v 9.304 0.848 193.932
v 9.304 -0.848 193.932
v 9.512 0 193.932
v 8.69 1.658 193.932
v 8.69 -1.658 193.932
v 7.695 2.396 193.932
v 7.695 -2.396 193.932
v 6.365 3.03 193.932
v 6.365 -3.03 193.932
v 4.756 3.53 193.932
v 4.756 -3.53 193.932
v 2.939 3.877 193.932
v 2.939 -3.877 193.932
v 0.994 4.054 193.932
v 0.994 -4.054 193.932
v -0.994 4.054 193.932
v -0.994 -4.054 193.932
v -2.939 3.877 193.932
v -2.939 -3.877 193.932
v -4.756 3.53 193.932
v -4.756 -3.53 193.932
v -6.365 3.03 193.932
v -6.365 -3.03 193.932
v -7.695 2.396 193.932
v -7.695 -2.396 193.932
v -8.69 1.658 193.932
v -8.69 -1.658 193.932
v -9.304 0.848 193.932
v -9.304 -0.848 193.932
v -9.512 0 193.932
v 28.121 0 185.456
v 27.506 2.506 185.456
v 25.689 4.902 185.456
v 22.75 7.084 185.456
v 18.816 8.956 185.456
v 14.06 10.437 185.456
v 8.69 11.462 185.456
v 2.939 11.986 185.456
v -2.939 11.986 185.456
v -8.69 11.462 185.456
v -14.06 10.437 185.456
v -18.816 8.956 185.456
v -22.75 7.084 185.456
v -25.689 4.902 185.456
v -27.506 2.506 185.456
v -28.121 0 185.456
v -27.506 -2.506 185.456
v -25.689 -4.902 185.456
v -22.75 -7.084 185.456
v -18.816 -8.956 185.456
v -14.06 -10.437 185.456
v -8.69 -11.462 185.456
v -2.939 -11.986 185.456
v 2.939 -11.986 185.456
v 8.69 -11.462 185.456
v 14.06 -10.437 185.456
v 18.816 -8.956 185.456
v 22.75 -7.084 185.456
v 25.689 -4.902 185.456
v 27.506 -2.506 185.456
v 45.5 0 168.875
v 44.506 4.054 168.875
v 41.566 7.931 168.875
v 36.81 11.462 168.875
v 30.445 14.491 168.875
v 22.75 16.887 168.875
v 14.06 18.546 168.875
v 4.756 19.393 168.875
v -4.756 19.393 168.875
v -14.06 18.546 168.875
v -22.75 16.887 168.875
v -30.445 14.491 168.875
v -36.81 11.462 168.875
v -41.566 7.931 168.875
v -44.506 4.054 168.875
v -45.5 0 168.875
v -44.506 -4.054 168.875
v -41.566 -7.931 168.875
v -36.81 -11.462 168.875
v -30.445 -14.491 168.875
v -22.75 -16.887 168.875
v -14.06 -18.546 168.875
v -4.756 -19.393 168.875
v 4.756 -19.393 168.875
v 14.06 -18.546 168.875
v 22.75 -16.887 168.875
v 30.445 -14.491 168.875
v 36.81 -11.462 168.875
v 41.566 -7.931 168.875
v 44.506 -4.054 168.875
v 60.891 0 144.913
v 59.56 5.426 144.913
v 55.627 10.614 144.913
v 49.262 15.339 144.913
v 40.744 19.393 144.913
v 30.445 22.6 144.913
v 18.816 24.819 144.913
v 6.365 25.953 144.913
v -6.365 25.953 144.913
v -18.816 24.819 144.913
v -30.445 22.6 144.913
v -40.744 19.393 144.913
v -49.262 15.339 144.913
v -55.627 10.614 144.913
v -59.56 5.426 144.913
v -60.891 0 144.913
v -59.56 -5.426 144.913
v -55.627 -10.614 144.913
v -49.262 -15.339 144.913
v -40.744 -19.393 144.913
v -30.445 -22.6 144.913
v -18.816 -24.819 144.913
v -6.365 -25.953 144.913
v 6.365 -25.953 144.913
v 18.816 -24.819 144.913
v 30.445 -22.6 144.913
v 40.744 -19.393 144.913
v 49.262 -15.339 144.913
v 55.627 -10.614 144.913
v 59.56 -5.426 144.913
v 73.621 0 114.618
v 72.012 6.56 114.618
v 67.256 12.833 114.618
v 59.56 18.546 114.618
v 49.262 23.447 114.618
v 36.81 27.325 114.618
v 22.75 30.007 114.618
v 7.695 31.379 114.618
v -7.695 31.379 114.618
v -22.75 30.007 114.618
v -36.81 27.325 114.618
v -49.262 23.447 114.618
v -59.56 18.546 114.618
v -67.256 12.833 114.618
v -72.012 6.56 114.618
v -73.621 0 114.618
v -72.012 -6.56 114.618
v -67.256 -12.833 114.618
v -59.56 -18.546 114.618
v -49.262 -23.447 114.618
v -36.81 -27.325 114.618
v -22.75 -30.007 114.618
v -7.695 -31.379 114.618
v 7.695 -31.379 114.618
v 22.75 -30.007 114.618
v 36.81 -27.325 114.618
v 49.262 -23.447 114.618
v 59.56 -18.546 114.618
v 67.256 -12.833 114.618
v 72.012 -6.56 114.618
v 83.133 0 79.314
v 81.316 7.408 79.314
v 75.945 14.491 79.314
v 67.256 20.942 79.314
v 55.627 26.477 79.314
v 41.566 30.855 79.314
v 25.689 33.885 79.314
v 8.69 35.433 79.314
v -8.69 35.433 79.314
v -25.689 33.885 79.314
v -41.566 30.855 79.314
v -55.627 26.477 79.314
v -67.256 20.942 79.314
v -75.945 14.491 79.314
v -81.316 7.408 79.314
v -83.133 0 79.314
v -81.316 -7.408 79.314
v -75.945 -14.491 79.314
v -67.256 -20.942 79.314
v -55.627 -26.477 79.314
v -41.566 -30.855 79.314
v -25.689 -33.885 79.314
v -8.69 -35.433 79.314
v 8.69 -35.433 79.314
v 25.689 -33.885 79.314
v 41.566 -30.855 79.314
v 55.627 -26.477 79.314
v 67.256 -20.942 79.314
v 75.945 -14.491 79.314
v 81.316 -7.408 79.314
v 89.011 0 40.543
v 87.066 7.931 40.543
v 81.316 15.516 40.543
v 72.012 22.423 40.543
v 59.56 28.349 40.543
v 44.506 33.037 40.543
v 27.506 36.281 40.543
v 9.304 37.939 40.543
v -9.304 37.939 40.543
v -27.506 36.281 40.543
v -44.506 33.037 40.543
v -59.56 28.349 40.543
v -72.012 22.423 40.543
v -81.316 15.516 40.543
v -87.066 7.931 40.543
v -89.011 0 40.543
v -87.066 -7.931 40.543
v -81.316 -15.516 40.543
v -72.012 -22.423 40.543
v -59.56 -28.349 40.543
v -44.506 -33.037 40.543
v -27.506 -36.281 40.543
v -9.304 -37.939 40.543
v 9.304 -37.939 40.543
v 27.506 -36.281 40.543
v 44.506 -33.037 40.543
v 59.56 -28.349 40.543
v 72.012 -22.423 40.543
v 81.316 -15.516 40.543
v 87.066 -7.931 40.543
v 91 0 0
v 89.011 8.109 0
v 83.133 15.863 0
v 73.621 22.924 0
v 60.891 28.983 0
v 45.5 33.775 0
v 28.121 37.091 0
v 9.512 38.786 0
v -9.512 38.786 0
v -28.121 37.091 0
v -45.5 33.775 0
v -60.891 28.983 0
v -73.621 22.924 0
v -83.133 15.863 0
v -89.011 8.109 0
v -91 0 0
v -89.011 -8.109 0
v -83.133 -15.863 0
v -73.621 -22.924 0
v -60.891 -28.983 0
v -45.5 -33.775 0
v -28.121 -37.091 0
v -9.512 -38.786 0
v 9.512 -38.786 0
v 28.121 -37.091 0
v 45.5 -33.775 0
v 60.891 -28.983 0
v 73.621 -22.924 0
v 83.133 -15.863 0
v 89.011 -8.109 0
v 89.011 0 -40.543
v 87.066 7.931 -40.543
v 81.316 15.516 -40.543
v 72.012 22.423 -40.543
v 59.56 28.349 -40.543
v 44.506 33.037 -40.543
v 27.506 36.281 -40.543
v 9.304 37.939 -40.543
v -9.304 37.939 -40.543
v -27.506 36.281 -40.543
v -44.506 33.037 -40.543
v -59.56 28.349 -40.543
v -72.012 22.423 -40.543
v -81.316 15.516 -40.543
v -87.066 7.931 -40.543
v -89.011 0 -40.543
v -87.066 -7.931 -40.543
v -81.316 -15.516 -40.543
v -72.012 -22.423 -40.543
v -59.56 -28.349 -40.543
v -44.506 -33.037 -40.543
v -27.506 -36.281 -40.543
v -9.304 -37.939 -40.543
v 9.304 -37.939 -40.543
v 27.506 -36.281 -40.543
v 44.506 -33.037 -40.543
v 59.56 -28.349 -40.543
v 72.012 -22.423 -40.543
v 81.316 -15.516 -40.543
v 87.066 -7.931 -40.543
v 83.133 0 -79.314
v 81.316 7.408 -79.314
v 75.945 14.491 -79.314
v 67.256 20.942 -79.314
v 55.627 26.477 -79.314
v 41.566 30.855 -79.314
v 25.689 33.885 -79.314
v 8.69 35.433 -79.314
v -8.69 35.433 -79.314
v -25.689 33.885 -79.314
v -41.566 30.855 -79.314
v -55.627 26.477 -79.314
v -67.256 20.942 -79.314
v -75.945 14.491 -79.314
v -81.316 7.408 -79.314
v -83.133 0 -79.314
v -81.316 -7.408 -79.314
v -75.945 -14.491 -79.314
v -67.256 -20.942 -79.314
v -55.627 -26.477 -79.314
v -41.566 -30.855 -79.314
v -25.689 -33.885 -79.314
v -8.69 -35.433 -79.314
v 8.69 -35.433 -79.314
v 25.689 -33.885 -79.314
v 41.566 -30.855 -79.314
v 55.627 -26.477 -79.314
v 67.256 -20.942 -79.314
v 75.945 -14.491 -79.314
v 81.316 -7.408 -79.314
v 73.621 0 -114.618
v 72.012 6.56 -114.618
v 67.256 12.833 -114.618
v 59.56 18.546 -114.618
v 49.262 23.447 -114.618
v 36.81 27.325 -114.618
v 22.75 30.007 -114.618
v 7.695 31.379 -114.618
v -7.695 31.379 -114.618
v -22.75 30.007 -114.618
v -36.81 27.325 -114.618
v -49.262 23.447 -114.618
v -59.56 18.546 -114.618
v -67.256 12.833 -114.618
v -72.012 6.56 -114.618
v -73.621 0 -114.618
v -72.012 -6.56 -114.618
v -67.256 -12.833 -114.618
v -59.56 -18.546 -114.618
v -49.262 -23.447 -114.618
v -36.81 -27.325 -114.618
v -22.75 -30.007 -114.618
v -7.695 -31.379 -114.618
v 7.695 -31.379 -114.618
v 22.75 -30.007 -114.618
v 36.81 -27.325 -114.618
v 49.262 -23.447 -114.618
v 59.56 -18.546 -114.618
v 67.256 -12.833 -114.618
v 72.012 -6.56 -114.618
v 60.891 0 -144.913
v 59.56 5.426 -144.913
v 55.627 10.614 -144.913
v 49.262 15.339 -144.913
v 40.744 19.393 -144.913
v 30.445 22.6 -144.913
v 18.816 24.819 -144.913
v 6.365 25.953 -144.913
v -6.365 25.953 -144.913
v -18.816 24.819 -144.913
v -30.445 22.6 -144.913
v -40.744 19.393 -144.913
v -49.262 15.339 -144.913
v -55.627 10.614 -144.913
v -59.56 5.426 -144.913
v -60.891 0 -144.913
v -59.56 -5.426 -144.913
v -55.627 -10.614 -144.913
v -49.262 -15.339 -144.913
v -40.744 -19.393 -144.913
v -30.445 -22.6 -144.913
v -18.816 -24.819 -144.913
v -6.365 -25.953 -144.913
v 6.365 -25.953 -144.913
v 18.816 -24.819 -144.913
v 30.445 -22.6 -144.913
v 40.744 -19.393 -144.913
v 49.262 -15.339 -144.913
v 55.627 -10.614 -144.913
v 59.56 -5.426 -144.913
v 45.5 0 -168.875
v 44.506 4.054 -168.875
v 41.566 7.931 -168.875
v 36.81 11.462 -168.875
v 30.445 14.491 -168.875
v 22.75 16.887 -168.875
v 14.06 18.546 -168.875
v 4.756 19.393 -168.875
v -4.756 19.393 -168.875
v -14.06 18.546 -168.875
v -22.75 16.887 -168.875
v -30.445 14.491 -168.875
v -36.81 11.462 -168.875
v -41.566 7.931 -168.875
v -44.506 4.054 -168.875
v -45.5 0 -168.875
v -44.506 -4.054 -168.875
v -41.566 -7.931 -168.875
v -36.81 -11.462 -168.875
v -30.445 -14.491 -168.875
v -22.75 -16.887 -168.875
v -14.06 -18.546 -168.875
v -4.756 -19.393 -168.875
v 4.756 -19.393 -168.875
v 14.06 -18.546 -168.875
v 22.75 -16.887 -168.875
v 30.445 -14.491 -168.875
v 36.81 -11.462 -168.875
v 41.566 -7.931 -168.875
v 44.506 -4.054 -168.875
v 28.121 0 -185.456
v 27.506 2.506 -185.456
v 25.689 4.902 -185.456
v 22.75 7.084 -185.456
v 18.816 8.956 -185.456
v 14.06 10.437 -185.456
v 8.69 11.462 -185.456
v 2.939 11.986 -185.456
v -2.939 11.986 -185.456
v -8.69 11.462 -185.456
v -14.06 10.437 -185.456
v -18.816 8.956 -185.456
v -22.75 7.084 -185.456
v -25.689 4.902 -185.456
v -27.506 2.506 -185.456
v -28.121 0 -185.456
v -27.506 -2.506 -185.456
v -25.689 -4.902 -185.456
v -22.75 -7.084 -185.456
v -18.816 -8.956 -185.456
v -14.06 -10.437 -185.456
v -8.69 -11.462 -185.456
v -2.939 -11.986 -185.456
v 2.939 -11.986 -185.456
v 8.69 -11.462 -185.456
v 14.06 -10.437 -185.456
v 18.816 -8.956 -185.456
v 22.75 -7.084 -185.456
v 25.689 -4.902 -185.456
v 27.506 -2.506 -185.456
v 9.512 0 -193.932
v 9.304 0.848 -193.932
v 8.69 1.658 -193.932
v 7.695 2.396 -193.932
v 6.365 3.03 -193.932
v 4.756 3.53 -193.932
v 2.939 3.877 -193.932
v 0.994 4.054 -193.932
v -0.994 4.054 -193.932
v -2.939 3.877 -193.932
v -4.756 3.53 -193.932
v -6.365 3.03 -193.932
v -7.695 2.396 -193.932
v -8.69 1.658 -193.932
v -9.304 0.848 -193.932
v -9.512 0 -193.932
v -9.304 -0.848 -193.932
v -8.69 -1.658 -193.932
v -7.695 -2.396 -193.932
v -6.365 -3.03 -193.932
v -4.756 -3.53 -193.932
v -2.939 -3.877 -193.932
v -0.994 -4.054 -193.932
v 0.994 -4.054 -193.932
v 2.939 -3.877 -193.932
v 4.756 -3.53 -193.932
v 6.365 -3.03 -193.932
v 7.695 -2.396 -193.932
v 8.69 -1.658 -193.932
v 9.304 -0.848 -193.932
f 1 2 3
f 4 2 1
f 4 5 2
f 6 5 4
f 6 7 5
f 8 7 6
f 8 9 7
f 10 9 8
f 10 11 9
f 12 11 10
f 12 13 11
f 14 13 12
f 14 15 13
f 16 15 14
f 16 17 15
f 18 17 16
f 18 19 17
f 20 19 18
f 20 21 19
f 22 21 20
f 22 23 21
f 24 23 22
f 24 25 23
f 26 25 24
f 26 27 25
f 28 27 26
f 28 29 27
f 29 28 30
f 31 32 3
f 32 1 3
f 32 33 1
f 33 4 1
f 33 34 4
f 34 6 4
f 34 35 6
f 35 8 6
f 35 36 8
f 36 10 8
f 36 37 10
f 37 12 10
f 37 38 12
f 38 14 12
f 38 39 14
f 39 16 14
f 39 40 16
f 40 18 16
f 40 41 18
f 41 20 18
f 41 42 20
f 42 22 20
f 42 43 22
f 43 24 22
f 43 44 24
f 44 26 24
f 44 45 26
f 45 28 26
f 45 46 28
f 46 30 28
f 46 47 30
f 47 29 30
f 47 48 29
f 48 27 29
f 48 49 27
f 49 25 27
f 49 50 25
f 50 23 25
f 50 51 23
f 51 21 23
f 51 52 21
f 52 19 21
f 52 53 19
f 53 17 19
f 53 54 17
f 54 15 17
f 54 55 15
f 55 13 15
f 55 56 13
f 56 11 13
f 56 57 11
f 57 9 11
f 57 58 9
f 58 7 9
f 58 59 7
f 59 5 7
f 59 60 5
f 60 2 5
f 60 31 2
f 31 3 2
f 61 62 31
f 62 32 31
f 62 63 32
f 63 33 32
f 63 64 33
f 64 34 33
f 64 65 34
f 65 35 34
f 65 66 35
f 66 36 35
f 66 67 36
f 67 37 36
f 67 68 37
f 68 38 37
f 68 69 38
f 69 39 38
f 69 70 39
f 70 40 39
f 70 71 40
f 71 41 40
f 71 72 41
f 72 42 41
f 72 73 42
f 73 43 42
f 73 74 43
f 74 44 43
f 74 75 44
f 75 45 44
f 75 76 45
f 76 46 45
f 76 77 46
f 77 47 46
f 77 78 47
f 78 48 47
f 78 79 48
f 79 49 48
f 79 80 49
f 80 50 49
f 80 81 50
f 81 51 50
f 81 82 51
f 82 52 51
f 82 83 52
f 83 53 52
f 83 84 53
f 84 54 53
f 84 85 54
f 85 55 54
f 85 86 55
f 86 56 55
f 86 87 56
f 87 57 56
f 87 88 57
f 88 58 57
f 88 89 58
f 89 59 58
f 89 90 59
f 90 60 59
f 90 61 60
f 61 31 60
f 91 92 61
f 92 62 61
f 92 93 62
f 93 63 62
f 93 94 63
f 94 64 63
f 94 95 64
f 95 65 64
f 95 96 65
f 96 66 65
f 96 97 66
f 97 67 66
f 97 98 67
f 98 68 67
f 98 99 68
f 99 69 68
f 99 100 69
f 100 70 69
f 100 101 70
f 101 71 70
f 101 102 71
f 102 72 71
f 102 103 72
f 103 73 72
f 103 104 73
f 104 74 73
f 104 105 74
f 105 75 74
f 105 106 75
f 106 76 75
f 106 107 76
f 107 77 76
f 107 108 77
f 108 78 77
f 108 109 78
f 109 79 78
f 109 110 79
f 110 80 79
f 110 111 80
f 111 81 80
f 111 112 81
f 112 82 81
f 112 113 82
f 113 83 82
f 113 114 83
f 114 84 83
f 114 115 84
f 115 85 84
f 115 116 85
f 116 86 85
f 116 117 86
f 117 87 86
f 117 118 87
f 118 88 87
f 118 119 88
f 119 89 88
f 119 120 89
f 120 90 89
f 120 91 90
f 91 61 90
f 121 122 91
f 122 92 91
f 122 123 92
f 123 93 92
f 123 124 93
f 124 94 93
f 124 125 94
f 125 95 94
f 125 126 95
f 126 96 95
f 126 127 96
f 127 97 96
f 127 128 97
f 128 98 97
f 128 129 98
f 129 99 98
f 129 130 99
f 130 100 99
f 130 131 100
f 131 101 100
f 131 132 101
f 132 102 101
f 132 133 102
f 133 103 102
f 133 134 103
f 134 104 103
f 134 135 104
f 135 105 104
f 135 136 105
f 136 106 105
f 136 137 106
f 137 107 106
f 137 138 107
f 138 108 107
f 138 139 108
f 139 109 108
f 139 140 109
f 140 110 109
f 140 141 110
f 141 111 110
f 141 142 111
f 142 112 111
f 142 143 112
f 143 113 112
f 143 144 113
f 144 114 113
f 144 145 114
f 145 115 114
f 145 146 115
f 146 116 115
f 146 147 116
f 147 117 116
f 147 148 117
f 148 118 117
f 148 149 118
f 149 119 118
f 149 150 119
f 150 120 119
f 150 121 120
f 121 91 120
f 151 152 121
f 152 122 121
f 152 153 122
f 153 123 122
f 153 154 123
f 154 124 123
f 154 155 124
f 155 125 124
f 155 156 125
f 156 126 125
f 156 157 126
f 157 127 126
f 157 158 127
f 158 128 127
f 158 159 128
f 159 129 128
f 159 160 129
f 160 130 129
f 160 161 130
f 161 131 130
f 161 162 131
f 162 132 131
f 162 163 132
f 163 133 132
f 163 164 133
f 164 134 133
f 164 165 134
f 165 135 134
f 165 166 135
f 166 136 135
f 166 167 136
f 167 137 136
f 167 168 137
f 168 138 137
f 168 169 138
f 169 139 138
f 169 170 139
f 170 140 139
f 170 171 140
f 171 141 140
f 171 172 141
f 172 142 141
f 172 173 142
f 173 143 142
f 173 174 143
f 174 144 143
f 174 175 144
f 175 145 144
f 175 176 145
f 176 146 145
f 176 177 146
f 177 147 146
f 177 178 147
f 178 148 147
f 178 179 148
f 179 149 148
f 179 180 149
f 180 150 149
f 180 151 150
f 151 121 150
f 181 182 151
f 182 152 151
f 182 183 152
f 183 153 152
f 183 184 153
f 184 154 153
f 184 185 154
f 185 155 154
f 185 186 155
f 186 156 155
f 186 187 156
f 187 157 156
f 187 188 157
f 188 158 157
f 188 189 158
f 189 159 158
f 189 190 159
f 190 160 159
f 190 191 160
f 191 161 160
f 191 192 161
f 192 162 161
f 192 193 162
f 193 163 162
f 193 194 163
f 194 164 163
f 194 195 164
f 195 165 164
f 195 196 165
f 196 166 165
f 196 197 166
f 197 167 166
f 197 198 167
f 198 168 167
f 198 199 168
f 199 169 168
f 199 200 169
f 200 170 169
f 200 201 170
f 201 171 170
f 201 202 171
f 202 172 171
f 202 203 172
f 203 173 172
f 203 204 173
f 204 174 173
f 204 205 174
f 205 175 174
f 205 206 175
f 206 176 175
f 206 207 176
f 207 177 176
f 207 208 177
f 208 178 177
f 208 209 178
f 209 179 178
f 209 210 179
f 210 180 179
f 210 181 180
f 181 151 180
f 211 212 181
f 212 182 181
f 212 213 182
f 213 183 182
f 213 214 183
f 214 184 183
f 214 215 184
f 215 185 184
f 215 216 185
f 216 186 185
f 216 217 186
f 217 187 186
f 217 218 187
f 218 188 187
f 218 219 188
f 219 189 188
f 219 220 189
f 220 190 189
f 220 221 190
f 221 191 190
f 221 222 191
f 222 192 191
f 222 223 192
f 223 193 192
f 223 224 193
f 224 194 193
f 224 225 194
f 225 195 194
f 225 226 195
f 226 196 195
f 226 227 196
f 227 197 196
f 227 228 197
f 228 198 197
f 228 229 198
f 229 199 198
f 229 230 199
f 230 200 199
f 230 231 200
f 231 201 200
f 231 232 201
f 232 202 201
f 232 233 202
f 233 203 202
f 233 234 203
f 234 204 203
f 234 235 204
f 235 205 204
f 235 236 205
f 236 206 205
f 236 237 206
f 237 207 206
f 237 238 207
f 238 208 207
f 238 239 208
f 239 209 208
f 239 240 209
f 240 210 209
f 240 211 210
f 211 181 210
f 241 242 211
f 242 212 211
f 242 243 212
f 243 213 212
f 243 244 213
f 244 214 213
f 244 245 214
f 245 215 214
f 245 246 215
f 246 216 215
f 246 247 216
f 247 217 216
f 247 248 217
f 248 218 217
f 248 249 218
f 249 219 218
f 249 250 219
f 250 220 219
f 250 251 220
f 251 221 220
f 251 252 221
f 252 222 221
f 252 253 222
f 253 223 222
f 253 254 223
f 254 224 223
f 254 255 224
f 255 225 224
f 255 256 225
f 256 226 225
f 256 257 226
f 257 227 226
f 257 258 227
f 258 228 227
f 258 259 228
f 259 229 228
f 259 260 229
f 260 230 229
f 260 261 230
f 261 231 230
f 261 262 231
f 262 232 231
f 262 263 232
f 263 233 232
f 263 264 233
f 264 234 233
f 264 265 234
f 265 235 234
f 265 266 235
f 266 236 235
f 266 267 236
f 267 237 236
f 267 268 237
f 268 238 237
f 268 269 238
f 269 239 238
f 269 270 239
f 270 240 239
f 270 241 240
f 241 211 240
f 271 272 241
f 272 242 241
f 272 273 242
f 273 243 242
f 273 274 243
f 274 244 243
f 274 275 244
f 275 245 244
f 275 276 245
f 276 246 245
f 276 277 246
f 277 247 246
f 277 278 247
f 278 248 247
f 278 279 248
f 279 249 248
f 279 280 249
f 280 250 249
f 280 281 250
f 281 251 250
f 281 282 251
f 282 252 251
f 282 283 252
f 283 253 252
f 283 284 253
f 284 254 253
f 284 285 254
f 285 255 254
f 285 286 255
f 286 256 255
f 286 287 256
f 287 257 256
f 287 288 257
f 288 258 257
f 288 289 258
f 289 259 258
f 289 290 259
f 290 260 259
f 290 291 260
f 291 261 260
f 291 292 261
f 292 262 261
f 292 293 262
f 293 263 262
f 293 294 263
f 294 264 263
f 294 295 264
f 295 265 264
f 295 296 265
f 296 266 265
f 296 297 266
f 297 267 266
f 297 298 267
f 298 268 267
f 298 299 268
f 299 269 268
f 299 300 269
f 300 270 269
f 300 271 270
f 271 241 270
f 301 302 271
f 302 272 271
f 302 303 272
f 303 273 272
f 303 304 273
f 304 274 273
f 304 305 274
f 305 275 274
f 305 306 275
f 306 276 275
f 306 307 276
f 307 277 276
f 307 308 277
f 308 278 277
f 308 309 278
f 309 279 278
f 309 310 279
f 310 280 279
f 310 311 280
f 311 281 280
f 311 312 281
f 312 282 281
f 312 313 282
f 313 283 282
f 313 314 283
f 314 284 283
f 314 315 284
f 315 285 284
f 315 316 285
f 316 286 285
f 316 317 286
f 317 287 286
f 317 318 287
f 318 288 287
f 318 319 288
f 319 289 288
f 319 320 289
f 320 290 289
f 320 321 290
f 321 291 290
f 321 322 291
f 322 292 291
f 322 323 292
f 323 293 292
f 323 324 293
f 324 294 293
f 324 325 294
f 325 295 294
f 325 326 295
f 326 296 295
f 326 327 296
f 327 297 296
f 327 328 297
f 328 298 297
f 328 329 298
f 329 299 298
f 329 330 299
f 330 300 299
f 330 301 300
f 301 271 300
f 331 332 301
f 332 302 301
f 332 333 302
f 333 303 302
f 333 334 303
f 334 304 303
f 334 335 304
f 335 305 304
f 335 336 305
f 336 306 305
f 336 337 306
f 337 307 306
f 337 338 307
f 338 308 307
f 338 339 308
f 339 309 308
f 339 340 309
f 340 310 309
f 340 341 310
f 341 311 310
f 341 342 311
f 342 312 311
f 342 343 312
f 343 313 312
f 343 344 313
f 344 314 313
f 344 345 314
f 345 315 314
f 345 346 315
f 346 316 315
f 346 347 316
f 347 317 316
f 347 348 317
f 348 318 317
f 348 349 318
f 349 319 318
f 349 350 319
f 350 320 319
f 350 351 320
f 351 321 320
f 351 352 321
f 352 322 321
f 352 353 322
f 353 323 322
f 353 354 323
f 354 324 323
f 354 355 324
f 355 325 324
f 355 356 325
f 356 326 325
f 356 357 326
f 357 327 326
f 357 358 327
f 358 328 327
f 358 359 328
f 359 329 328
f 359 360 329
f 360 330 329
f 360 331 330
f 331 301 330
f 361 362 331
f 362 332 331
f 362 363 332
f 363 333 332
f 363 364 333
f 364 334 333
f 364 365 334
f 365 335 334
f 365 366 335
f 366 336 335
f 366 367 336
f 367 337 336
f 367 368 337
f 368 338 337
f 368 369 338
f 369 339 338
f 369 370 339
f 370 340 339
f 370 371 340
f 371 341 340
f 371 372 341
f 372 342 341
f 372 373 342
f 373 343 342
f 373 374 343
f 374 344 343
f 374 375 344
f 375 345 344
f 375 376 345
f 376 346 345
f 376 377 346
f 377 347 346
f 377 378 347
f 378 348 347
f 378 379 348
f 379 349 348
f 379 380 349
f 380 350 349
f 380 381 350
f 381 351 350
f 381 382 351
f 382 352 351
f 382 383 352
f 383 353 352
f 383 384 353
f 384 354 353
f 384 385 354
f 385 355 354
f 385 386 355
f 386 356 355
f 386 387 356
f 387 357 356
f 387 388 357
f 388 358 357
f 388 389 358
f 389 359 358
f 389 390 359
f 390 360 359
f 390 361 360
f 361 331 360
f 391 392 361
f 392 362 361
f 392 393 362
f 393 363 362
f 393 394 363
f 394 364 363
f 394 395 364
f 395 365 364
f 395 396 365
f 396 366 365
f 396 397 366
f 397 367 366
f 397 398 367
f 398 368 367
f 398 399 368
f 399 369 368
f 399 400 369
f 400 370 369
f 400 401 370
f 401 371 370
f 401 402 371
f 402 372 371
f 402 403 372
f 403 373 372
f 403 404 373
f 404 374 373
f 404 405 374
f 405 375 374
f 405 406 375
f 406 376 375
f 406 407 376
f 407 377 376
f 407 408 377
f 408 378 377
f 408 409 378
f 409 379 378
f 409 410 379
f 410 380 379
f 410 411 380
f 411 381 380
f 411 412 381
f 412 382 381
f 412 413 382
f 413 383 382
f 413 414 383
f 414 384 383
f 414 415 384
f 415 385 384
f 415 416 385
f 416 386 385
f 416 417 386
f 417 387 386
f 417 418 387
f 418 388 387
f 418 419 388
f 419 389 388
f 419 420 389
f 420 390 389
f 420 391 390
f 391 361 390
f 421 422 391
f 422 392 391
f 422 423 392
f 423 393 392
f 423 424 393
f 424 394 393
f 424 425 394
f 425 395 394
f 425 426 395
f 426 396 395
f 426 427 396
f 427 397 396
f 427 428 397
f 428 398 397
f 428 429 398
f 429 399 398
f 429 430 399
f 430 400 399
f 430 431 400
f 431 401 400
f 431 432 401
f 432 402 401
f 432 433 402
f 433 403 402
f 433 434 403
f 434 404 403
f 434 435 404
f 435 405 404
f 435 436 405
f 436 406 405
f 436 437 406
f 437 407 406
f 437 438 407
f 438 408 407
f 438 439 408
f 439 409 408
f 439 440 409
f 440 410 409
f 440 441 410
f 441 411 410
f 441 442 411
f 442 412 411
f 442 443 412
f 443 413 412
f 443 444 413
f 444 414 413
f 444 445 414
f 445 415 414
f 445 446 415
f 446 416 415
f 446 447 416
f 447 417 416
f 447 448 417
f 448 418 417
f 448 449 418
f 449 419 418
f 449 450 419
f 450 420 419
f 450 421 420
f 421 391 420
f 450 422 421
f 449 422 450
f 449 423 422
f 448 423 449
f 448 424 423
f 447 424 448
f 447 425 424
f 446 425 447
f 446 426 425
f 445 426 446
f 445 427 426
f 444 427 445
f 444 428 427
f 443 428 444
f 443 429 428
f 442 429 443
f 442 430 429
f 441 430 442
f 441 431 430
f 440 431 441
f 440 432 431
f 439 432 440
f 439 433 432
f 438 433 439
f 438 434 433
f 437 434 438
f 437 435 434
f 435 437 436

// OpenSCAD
// Generated by SolidPython 1.0.1 on 2020-07-29 00:46:47


scale(v = [7, 3, 15]) {
	sphere(r = 13);
}
/***********************************************
*********      SolidPython code:      **********
************************************************
 
# import packages: SolidPython
from solid import *
from solid.utils import *
from itertools import chain, combinations, permutations


class Resize:

    def __init__(self, scad_file):
        self.scad_file = scad_file
        #self.scad_file = import_scad(scad_file)
        # cone/cylinder param:
        self.r1 = 0
        self.r2 = 0
        self.h = 0
        # rectangular prism param:
        self.w = 0
        self.l = 0
        # ellipse param:
        self.r = 0

    # import OpenScad code (file name corresponds to shape)


    # classify shape + parameters
    def assign(self, param1, param2, param3):
        if self.scad_file == 'cone.scad':
            self.r1 = param1
            self.r2 = param2
            self.h = param3
        elif self.scad_file == 'cylinder.scad':
            self.r1 = param1
            self.r2 = param2
            self.h = param3
        elif self.scad_file == 'rectangularPrism.scad':
            self.h = param1
            self.l = param2
            self.w = param3
        else:
            self.r = param1
            self.h = param2

    # resize parameters
    def iterate(self):
        x = range(3, 20, 2)
        i = 1
        if self.scad_file == 'cone.scad':
            tempList = list(permutations(x, 2))
            for temp in tempList:
                param1 = temp[0]
                param2 = temp[1]
                filepath = 'produced_scad_files/' + 'cone' + str(param1) + '_' + str(param2) + '_' + '.scad'
                scad_render_to_file(cylinder(h=param1, r1=param2, r2=0), filepath)

        elif self.scad_file == 'cylinder.scad':
            tempList = list(permutations(x, 3))
            for temp in tempList:
                param1 = temp[0]
                param2 = temp[1]
                filepath = 'produced_scad_files/' + 'cylinder' + str(param1) + '_' + str(param2) + '_' + '.scad'
                scad_render_to_file(cylinder(h=param1, r1=param2, r2=param2), filepath)

        elif self.scad_file == 'rectangularPrism.scad':
            tempList = list(permutations(x, 3))
            for temp in tempList:
                param1 = temp[0]
                param2 = temp[1]
                param3 = temp[2]
                filepath = 'produced_scad_files/' + 'rectangularPrism' + str(param1) + '_' + str(param2) + '_' + str(
                    param3) + '.scad'
                scad_render_to_file(cube(size=(param1, param2, param3)), filepath)

        elif self.scad_file == 'ellipse.scad':
            tempList = list(permutations(x, 4))
            for temp in tempList:
                param1 = temp[0]
                param2 = temp[1]
                param3 = temp[2]
                param4 = temp[3]
                filepath = 'produced_scad_files/' + 'ellipse' + str(param1) + '_' + str(param2) + '_' + str(param3) + '_' + str(param4) + '.scad'
                scad_render_to_file(scale([param1, param2, param3])(sphere(r=param4)), filepath)

    def render_to_scadfile(self):
        scad_render_to_file(scad, 'example.scad') 
 
************************************************/
